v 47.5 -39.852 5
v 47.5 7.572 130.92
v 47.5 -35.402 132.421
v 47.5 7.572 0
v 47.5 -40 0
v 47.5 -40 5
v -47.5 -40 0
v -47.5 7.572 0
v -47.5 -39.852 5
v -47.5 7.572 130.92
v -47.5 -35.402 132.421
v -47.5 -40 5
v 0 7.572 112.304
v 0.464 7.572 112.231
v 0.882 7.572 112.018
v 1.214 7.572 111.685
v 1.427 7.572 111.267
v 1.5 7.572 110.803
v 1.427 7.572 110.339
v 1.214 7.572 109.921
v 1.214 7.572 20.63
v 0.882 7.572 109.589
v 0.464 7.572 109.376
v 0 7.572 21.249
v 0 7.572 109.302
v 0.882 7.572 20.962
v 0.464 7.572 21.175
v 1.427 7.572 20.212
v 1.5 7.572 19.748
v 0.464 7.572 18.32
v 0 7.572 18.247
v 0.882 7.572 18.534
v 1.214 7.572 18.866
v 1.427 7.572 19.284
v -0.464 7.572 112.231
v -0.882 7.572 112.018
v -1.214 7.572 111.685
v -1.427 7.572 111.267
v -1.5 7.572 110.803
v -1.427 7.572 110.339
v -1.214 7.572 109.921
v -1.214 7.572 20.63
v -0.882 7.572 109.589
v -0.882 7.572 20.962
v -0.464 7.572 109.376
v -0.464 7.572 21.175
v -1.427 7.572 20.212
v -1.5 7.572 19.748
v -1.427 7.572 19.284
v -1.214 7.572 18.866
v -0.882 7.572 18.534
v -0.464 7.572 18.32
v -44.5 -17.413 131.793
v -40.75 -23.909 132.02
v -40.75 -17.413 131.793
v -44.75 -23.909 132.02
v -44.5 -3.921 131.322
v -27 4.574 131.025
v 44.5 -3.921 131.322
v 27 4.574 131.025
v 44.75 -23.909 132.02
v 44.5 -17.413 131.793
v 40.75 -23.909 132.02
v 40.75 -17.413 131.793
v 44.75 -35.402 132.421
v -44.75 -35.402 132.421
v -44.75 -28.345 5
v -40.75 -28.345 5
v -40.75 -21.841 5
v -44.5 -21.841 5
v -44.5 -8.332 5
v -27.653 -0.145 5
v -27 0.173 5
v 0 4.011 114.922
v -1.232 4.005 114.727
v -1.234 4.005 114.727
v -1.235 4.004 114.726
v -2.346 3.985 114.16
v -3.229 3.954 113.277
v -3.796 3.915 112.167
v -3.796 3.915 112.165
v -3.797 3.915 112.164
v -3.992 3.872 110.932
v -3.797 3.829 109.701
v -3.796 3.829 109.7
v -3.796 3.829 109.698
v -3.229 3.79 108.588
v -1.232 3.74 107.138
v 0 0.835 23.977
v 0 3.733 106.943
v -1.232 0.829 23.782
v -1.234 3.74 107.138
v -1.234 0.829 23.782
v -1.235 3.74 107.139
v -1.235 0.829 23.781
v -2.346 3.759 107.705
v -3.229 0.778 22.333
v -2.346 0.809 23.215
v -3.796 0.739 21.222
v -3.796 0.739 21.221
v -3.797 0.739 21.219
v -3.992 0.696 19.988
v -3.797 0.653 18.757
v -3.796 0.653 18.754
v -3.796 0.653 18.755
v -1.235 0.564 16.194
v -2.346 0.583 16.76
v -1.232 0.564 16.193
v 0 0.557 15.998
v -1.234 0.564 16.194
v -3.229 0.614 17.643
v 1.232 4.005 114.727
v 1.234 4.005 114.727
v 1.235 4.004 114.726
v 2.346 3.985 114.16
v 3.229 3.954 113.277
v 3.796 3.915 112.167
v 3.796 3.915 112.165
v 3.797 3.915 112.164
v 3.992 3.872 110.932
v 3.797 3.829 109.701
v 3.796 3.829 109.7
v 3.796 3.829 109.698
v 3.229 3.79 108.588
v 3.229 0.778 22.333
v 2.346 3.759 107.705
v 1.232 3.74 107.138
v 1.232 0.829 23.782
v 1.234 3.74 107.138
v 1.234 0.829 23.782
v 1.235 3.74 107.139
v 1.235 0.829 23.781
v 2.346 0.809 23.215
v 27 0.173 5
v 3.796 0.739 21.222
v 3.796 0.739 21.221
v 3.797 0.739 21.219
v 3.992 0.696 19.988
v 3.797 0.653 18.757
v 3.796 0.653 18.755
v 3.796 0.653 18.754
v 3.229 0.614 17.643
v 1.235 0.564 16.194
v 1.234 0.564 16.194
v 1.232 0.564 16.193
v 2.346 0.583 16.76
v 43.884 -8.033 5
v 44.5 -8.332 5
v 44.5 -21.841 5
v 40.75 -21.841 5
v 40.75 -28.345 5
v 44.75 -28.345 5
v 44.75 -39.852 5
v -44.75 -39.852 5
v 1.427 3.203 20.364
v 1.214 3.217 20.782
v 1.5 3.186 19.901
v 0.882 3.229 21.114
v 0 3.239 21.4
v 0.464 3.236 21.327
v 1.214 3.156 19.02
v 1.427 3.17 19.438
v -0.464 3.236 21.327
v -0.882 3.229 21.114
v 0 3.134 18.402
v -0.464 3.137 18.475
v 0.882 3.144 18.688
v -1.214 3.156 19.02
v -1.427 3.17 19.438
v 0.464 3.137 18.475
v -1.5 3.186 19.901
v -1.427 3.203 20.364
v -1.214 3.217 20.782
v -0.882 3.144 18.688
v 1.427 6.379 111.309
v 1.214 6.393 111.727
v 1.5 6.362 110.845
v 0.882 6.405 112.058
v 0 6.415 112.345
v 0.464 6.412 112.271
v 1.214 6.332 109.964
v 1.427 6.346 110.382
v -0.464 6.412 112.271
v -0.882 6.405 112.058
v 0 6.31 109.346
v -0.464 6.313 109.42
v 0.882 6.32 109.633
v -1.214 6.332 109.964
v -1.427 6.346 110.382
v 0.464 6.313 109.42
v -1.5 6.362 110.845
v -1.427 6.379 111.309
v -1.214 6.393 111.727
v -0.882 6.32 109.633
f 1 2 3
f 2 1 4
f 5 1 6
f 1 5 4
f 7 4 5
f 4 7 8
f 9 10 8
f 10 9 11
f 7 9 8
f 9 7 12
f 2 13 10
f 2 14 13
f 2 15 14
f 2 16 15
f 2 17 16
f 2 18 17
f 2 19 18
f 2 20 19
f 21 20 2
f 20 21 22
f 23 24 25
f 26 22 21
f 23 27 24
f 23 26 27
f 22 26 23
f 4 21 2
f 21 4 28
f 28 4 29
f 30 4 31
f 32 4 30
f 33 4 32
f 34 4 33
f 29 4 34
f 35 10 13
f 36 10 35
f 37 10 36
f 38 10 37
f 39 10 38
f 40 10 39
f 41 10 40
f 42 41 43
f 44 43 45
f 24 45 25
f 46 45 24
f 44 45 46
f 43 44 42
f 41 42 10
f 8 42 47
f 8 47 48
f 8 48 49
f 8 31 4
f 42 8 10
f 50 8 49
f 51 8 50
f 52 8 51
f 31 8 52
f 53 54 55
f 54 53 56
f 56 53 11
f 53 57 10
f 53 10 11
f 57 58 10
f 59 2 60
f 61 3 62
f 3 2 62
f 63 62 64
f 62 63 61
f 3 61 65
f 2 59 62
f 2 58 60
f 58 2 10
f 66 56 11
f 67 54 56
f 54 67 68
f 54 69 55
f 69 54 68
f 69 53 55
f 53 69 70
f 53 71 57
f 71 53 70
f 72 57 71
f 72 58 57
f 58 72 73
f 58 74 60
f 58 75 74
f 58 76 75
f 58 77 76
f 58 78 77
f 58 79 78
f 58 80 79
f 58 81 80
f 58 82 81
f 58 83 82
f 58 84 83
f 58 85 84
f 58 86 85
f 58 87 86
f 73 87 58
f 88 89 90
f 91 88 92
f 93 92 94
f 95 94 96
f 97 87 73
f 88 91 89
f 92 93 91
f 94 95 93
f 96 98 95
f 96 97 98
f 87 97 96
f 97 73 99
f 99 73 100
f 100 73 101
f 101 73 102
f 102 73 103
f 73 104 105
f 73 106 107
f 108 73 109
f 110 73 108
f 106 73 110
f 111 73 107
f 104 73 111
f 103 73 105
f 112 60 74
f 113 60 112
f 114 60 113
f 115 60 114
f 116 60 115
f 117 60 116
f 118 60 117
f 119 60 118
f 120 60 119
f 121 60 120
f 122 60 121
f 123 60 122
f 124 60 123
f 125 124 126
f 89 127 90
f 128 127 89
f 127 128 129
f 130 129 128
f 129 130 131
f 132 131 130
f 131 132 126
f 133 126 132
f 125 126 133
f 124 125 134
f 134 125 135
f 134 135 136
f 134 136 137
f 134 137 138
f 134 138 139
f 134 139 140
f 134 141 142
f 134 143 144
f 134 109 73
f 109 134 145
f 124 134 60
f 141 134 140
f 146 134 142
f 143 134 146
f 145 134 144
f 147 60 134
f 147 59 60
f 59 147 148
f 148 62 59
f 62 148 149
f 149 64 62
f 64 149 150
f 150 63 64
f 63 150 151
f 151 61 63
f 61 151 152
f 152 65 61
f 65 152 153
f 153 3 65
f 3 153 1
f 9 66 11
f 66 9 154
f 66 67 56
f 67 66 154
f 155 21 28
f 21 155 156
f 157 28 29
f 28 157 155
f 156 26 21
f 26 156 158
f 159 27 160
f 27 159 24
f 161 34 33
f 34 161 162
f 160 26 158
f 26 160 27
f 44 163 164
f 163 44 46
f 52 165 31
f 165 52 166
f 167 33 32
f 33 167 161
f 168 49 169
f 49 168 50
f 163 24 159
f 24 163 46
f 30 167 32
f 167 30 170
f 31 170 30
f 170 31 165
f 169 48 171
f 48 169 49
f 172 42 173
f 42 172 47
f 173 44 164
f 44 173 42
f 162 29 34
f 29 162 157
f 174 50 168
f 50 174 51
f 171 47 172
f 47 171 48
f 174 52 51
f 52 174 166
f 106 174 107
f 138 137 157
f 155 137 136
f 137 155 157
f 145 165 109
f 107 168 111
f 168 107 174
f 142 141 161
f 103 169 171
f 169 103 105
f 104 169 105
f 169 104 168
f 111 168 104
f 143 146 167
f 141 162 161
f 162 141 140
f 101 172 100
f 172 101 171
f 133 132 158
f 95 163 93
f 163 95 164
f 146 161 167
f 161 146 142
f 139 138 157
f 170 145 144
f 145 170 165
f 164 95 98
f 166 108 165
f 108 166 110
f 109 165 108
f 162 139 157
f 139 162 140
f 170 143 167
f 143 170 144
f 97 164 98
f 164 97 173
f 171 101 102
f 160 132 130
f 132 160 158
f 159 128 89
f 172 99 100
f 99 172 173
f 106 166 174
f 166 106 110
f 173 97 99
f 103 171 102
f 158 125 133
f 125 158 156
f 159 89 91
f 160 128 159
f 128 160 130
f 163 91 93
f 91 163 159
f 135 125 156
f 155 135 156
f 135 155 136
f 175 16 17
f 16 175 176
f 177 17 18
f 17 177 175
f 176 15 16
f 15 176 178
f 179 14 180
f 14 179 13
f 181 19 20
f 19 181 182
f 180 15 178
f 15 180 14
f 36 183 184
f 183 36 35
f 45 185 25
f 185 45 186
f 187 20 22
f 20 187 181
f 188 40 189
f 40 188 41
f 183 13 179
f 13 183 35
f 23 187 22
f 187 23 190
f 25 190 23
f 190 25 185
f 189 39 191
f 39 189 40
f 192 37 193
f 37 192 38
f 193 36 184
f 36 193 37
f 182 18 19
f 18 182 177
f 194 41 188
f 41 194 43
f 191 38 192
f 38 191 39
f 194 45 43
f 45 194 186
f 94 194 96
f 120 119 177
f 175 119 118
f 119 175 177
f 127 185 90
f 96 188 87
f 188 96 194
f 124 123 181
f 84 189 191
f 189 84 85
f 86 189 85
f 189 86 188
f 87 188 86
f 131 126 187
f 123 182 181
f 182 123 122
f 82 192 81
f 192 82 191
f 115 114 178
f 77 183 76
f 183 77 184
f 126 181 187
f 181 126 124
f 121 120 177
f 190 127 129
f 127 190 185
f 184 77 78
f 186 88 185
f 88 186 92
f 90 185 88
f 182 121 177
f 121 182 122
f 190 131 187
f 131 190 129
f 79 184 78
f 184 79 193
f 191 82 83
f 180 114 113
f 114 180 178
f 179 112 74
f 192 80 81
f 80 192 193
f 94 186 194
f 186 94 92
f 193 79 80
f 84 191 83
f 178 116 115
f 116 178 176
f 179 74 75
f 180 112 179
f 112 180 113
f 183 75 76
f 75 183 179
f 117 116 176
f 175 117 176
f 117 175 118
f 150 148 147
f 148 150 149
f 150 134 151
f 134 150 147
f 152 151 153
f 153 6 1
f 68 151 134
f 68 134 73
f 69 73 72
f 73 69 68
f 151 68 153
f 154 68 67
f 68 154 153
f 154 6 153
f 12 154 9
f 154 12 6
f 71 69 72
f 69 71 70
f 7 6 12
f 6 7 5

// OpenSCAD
module txl(x=0, y=0, z=0) { translate([x, y, z]) children();}
module rot(x=0, y=0, z=0) { rotate([x, y, z]) children();}

// X measurements
battery_top_width = 54;       battery_top_outer = battery_top_width/2;
// old version
battery_side_a_width = 89;    battery_side_a_outer = battery_side_a_width/2;
battery_side_b_width = 89;    battery_side_b_outer = battery_side_b_width/2;
// new version
//battery_side_a_width = 83;    battery_side_a_outer = battery_side_a_width/2;
//battery_side_b_width = 84;    battery_side_b_outer = battery_side_b_width/2;
battery_side_c_width = 89;    battery_side_c_outer = battery_side_c_width/2;
battery_side_d_width = 81.5;    battery_side_d_outer = battery_side_d_width/2;
battery_side_e_width = 89.5;  battery_side_e_outer = battery_side_e_width/2;
frame_width = 95;             frame_outer = frame_width/2;

// Y measurements
frame_height = +3;
battery_top = 0;
battery_side_a = -8.5;
battery_side_b = -18;
battery_side_c1 = -22;
battery_side_c = -22;
battery_side_df = -28.5;
battery_side_df1 = -28.5;
battery_side_db = -31.3;
battery_side_db1 = -31.3;
battery_side_e = -40;

// Z measurements
base_thick = 5;
slides_length = 126;
full_length = slides_length+base_thick;
hole_1_height = 20;
hole_2_height = full_length-20;

// angling
tilt_angle = 2;
tilt_y_dist = full_length * sin(tilt_angle);
tilt_z_dist = (frame_height - battery_side_e) * tan(tilt_angle);
t_base_thick = base_thick + tilt_z_dist;
screw_height = frame_height + tilt_y_dist;

$fn = 20;
// borrowed from pw_primitives
module countersink_hole(id, od, height) union() {
    or = min((od-id)/2, id);
    cylinder(h=height, d=id);
    translate([0, 0, height-or]) cylinder(h=or, d1=id, d2=od);
}

translate([-frame_outer, battery_side_e, 0])
  cube([frame_width, frame_height-battery_side_e, base_thick]);
difference() {
    union() {
        difference() {
            txl(x=-frame_outer, y=frame_height)
              cube([frame_width, tilt_y_dist, full_length*cos(tilt_angle)]);
            rot(x=-tilt_angle+0.1) txl(x=-frame_outer, y=frame_height-tilt_y_dist-0.01)
              cube([frame_width+0.2, tilt_y_dist, full_length]);
        };
        txl(y=frame_height) rot(x=-tilt_angle) txl(y=-frame_height)
          linear_extrude(full_length, convexity=3) { polygon([
            // From the middle of the top - heading anticlockwise.
            [+battery_top_outer, battery_top],
            // Around the inside right (+X)
            [+battery_side_a_outer, battery_side_a],  // diagonal
            [+battery_side_b_outer, battery_side_b],
            [+battery_side_c_outer, battery_side_b],
            [+battery_side_c_outer, battery_side_c],
            [+battery_side_d_outer, battery_side_c1],
            [+battery_side_d_outer, battery_side_df1],
            [+battery_side_e_outer, battery_side_df],
            [+battery_side_e_outer, battery_side_e],
            // Across the bottom of the frame to the outside right
            [+frame_outer, battery_side_e],
            // Then up across the top to the left (-X) side
            [+frame_outer, frame_height],
            [-frame_outer, frame_height],
            // Down to the bottom of the frame and to the inside left
            [-frame_outer, battery_side_e],
            // Up the inside left
            [-battery_side_e_outer, battery_side_e],
            [-battery_side_e_outer, battery_side_df],
            [-battery_side_d_outer, battery_side_df1],
            [-battery_side_d_outer, battery_side_c1],
            [-battery_side_c_outer, battery_side_c],
            [-battery_side_c_outer, battery_side_b],
            [-battery_side_b_outer, battery_side_b],
            [-battery_side_a_outer, battery_side_a],  // diagonal
            // And back to the top
            [-battery_top_outer, battery_top]
        ]);};
    };
    rot(x=-tilt_angle) txl(y=screw_height, z=hole_1_height) rot(x=90)
      countersink_hole(3, 8, screw_height+0.01);
    rot(x=-tilt_angle) txl(y=screw_height, z=hole_2_height) rot(x=90)
      countersink_hole(3, 8, screw_height+0.01);
}
